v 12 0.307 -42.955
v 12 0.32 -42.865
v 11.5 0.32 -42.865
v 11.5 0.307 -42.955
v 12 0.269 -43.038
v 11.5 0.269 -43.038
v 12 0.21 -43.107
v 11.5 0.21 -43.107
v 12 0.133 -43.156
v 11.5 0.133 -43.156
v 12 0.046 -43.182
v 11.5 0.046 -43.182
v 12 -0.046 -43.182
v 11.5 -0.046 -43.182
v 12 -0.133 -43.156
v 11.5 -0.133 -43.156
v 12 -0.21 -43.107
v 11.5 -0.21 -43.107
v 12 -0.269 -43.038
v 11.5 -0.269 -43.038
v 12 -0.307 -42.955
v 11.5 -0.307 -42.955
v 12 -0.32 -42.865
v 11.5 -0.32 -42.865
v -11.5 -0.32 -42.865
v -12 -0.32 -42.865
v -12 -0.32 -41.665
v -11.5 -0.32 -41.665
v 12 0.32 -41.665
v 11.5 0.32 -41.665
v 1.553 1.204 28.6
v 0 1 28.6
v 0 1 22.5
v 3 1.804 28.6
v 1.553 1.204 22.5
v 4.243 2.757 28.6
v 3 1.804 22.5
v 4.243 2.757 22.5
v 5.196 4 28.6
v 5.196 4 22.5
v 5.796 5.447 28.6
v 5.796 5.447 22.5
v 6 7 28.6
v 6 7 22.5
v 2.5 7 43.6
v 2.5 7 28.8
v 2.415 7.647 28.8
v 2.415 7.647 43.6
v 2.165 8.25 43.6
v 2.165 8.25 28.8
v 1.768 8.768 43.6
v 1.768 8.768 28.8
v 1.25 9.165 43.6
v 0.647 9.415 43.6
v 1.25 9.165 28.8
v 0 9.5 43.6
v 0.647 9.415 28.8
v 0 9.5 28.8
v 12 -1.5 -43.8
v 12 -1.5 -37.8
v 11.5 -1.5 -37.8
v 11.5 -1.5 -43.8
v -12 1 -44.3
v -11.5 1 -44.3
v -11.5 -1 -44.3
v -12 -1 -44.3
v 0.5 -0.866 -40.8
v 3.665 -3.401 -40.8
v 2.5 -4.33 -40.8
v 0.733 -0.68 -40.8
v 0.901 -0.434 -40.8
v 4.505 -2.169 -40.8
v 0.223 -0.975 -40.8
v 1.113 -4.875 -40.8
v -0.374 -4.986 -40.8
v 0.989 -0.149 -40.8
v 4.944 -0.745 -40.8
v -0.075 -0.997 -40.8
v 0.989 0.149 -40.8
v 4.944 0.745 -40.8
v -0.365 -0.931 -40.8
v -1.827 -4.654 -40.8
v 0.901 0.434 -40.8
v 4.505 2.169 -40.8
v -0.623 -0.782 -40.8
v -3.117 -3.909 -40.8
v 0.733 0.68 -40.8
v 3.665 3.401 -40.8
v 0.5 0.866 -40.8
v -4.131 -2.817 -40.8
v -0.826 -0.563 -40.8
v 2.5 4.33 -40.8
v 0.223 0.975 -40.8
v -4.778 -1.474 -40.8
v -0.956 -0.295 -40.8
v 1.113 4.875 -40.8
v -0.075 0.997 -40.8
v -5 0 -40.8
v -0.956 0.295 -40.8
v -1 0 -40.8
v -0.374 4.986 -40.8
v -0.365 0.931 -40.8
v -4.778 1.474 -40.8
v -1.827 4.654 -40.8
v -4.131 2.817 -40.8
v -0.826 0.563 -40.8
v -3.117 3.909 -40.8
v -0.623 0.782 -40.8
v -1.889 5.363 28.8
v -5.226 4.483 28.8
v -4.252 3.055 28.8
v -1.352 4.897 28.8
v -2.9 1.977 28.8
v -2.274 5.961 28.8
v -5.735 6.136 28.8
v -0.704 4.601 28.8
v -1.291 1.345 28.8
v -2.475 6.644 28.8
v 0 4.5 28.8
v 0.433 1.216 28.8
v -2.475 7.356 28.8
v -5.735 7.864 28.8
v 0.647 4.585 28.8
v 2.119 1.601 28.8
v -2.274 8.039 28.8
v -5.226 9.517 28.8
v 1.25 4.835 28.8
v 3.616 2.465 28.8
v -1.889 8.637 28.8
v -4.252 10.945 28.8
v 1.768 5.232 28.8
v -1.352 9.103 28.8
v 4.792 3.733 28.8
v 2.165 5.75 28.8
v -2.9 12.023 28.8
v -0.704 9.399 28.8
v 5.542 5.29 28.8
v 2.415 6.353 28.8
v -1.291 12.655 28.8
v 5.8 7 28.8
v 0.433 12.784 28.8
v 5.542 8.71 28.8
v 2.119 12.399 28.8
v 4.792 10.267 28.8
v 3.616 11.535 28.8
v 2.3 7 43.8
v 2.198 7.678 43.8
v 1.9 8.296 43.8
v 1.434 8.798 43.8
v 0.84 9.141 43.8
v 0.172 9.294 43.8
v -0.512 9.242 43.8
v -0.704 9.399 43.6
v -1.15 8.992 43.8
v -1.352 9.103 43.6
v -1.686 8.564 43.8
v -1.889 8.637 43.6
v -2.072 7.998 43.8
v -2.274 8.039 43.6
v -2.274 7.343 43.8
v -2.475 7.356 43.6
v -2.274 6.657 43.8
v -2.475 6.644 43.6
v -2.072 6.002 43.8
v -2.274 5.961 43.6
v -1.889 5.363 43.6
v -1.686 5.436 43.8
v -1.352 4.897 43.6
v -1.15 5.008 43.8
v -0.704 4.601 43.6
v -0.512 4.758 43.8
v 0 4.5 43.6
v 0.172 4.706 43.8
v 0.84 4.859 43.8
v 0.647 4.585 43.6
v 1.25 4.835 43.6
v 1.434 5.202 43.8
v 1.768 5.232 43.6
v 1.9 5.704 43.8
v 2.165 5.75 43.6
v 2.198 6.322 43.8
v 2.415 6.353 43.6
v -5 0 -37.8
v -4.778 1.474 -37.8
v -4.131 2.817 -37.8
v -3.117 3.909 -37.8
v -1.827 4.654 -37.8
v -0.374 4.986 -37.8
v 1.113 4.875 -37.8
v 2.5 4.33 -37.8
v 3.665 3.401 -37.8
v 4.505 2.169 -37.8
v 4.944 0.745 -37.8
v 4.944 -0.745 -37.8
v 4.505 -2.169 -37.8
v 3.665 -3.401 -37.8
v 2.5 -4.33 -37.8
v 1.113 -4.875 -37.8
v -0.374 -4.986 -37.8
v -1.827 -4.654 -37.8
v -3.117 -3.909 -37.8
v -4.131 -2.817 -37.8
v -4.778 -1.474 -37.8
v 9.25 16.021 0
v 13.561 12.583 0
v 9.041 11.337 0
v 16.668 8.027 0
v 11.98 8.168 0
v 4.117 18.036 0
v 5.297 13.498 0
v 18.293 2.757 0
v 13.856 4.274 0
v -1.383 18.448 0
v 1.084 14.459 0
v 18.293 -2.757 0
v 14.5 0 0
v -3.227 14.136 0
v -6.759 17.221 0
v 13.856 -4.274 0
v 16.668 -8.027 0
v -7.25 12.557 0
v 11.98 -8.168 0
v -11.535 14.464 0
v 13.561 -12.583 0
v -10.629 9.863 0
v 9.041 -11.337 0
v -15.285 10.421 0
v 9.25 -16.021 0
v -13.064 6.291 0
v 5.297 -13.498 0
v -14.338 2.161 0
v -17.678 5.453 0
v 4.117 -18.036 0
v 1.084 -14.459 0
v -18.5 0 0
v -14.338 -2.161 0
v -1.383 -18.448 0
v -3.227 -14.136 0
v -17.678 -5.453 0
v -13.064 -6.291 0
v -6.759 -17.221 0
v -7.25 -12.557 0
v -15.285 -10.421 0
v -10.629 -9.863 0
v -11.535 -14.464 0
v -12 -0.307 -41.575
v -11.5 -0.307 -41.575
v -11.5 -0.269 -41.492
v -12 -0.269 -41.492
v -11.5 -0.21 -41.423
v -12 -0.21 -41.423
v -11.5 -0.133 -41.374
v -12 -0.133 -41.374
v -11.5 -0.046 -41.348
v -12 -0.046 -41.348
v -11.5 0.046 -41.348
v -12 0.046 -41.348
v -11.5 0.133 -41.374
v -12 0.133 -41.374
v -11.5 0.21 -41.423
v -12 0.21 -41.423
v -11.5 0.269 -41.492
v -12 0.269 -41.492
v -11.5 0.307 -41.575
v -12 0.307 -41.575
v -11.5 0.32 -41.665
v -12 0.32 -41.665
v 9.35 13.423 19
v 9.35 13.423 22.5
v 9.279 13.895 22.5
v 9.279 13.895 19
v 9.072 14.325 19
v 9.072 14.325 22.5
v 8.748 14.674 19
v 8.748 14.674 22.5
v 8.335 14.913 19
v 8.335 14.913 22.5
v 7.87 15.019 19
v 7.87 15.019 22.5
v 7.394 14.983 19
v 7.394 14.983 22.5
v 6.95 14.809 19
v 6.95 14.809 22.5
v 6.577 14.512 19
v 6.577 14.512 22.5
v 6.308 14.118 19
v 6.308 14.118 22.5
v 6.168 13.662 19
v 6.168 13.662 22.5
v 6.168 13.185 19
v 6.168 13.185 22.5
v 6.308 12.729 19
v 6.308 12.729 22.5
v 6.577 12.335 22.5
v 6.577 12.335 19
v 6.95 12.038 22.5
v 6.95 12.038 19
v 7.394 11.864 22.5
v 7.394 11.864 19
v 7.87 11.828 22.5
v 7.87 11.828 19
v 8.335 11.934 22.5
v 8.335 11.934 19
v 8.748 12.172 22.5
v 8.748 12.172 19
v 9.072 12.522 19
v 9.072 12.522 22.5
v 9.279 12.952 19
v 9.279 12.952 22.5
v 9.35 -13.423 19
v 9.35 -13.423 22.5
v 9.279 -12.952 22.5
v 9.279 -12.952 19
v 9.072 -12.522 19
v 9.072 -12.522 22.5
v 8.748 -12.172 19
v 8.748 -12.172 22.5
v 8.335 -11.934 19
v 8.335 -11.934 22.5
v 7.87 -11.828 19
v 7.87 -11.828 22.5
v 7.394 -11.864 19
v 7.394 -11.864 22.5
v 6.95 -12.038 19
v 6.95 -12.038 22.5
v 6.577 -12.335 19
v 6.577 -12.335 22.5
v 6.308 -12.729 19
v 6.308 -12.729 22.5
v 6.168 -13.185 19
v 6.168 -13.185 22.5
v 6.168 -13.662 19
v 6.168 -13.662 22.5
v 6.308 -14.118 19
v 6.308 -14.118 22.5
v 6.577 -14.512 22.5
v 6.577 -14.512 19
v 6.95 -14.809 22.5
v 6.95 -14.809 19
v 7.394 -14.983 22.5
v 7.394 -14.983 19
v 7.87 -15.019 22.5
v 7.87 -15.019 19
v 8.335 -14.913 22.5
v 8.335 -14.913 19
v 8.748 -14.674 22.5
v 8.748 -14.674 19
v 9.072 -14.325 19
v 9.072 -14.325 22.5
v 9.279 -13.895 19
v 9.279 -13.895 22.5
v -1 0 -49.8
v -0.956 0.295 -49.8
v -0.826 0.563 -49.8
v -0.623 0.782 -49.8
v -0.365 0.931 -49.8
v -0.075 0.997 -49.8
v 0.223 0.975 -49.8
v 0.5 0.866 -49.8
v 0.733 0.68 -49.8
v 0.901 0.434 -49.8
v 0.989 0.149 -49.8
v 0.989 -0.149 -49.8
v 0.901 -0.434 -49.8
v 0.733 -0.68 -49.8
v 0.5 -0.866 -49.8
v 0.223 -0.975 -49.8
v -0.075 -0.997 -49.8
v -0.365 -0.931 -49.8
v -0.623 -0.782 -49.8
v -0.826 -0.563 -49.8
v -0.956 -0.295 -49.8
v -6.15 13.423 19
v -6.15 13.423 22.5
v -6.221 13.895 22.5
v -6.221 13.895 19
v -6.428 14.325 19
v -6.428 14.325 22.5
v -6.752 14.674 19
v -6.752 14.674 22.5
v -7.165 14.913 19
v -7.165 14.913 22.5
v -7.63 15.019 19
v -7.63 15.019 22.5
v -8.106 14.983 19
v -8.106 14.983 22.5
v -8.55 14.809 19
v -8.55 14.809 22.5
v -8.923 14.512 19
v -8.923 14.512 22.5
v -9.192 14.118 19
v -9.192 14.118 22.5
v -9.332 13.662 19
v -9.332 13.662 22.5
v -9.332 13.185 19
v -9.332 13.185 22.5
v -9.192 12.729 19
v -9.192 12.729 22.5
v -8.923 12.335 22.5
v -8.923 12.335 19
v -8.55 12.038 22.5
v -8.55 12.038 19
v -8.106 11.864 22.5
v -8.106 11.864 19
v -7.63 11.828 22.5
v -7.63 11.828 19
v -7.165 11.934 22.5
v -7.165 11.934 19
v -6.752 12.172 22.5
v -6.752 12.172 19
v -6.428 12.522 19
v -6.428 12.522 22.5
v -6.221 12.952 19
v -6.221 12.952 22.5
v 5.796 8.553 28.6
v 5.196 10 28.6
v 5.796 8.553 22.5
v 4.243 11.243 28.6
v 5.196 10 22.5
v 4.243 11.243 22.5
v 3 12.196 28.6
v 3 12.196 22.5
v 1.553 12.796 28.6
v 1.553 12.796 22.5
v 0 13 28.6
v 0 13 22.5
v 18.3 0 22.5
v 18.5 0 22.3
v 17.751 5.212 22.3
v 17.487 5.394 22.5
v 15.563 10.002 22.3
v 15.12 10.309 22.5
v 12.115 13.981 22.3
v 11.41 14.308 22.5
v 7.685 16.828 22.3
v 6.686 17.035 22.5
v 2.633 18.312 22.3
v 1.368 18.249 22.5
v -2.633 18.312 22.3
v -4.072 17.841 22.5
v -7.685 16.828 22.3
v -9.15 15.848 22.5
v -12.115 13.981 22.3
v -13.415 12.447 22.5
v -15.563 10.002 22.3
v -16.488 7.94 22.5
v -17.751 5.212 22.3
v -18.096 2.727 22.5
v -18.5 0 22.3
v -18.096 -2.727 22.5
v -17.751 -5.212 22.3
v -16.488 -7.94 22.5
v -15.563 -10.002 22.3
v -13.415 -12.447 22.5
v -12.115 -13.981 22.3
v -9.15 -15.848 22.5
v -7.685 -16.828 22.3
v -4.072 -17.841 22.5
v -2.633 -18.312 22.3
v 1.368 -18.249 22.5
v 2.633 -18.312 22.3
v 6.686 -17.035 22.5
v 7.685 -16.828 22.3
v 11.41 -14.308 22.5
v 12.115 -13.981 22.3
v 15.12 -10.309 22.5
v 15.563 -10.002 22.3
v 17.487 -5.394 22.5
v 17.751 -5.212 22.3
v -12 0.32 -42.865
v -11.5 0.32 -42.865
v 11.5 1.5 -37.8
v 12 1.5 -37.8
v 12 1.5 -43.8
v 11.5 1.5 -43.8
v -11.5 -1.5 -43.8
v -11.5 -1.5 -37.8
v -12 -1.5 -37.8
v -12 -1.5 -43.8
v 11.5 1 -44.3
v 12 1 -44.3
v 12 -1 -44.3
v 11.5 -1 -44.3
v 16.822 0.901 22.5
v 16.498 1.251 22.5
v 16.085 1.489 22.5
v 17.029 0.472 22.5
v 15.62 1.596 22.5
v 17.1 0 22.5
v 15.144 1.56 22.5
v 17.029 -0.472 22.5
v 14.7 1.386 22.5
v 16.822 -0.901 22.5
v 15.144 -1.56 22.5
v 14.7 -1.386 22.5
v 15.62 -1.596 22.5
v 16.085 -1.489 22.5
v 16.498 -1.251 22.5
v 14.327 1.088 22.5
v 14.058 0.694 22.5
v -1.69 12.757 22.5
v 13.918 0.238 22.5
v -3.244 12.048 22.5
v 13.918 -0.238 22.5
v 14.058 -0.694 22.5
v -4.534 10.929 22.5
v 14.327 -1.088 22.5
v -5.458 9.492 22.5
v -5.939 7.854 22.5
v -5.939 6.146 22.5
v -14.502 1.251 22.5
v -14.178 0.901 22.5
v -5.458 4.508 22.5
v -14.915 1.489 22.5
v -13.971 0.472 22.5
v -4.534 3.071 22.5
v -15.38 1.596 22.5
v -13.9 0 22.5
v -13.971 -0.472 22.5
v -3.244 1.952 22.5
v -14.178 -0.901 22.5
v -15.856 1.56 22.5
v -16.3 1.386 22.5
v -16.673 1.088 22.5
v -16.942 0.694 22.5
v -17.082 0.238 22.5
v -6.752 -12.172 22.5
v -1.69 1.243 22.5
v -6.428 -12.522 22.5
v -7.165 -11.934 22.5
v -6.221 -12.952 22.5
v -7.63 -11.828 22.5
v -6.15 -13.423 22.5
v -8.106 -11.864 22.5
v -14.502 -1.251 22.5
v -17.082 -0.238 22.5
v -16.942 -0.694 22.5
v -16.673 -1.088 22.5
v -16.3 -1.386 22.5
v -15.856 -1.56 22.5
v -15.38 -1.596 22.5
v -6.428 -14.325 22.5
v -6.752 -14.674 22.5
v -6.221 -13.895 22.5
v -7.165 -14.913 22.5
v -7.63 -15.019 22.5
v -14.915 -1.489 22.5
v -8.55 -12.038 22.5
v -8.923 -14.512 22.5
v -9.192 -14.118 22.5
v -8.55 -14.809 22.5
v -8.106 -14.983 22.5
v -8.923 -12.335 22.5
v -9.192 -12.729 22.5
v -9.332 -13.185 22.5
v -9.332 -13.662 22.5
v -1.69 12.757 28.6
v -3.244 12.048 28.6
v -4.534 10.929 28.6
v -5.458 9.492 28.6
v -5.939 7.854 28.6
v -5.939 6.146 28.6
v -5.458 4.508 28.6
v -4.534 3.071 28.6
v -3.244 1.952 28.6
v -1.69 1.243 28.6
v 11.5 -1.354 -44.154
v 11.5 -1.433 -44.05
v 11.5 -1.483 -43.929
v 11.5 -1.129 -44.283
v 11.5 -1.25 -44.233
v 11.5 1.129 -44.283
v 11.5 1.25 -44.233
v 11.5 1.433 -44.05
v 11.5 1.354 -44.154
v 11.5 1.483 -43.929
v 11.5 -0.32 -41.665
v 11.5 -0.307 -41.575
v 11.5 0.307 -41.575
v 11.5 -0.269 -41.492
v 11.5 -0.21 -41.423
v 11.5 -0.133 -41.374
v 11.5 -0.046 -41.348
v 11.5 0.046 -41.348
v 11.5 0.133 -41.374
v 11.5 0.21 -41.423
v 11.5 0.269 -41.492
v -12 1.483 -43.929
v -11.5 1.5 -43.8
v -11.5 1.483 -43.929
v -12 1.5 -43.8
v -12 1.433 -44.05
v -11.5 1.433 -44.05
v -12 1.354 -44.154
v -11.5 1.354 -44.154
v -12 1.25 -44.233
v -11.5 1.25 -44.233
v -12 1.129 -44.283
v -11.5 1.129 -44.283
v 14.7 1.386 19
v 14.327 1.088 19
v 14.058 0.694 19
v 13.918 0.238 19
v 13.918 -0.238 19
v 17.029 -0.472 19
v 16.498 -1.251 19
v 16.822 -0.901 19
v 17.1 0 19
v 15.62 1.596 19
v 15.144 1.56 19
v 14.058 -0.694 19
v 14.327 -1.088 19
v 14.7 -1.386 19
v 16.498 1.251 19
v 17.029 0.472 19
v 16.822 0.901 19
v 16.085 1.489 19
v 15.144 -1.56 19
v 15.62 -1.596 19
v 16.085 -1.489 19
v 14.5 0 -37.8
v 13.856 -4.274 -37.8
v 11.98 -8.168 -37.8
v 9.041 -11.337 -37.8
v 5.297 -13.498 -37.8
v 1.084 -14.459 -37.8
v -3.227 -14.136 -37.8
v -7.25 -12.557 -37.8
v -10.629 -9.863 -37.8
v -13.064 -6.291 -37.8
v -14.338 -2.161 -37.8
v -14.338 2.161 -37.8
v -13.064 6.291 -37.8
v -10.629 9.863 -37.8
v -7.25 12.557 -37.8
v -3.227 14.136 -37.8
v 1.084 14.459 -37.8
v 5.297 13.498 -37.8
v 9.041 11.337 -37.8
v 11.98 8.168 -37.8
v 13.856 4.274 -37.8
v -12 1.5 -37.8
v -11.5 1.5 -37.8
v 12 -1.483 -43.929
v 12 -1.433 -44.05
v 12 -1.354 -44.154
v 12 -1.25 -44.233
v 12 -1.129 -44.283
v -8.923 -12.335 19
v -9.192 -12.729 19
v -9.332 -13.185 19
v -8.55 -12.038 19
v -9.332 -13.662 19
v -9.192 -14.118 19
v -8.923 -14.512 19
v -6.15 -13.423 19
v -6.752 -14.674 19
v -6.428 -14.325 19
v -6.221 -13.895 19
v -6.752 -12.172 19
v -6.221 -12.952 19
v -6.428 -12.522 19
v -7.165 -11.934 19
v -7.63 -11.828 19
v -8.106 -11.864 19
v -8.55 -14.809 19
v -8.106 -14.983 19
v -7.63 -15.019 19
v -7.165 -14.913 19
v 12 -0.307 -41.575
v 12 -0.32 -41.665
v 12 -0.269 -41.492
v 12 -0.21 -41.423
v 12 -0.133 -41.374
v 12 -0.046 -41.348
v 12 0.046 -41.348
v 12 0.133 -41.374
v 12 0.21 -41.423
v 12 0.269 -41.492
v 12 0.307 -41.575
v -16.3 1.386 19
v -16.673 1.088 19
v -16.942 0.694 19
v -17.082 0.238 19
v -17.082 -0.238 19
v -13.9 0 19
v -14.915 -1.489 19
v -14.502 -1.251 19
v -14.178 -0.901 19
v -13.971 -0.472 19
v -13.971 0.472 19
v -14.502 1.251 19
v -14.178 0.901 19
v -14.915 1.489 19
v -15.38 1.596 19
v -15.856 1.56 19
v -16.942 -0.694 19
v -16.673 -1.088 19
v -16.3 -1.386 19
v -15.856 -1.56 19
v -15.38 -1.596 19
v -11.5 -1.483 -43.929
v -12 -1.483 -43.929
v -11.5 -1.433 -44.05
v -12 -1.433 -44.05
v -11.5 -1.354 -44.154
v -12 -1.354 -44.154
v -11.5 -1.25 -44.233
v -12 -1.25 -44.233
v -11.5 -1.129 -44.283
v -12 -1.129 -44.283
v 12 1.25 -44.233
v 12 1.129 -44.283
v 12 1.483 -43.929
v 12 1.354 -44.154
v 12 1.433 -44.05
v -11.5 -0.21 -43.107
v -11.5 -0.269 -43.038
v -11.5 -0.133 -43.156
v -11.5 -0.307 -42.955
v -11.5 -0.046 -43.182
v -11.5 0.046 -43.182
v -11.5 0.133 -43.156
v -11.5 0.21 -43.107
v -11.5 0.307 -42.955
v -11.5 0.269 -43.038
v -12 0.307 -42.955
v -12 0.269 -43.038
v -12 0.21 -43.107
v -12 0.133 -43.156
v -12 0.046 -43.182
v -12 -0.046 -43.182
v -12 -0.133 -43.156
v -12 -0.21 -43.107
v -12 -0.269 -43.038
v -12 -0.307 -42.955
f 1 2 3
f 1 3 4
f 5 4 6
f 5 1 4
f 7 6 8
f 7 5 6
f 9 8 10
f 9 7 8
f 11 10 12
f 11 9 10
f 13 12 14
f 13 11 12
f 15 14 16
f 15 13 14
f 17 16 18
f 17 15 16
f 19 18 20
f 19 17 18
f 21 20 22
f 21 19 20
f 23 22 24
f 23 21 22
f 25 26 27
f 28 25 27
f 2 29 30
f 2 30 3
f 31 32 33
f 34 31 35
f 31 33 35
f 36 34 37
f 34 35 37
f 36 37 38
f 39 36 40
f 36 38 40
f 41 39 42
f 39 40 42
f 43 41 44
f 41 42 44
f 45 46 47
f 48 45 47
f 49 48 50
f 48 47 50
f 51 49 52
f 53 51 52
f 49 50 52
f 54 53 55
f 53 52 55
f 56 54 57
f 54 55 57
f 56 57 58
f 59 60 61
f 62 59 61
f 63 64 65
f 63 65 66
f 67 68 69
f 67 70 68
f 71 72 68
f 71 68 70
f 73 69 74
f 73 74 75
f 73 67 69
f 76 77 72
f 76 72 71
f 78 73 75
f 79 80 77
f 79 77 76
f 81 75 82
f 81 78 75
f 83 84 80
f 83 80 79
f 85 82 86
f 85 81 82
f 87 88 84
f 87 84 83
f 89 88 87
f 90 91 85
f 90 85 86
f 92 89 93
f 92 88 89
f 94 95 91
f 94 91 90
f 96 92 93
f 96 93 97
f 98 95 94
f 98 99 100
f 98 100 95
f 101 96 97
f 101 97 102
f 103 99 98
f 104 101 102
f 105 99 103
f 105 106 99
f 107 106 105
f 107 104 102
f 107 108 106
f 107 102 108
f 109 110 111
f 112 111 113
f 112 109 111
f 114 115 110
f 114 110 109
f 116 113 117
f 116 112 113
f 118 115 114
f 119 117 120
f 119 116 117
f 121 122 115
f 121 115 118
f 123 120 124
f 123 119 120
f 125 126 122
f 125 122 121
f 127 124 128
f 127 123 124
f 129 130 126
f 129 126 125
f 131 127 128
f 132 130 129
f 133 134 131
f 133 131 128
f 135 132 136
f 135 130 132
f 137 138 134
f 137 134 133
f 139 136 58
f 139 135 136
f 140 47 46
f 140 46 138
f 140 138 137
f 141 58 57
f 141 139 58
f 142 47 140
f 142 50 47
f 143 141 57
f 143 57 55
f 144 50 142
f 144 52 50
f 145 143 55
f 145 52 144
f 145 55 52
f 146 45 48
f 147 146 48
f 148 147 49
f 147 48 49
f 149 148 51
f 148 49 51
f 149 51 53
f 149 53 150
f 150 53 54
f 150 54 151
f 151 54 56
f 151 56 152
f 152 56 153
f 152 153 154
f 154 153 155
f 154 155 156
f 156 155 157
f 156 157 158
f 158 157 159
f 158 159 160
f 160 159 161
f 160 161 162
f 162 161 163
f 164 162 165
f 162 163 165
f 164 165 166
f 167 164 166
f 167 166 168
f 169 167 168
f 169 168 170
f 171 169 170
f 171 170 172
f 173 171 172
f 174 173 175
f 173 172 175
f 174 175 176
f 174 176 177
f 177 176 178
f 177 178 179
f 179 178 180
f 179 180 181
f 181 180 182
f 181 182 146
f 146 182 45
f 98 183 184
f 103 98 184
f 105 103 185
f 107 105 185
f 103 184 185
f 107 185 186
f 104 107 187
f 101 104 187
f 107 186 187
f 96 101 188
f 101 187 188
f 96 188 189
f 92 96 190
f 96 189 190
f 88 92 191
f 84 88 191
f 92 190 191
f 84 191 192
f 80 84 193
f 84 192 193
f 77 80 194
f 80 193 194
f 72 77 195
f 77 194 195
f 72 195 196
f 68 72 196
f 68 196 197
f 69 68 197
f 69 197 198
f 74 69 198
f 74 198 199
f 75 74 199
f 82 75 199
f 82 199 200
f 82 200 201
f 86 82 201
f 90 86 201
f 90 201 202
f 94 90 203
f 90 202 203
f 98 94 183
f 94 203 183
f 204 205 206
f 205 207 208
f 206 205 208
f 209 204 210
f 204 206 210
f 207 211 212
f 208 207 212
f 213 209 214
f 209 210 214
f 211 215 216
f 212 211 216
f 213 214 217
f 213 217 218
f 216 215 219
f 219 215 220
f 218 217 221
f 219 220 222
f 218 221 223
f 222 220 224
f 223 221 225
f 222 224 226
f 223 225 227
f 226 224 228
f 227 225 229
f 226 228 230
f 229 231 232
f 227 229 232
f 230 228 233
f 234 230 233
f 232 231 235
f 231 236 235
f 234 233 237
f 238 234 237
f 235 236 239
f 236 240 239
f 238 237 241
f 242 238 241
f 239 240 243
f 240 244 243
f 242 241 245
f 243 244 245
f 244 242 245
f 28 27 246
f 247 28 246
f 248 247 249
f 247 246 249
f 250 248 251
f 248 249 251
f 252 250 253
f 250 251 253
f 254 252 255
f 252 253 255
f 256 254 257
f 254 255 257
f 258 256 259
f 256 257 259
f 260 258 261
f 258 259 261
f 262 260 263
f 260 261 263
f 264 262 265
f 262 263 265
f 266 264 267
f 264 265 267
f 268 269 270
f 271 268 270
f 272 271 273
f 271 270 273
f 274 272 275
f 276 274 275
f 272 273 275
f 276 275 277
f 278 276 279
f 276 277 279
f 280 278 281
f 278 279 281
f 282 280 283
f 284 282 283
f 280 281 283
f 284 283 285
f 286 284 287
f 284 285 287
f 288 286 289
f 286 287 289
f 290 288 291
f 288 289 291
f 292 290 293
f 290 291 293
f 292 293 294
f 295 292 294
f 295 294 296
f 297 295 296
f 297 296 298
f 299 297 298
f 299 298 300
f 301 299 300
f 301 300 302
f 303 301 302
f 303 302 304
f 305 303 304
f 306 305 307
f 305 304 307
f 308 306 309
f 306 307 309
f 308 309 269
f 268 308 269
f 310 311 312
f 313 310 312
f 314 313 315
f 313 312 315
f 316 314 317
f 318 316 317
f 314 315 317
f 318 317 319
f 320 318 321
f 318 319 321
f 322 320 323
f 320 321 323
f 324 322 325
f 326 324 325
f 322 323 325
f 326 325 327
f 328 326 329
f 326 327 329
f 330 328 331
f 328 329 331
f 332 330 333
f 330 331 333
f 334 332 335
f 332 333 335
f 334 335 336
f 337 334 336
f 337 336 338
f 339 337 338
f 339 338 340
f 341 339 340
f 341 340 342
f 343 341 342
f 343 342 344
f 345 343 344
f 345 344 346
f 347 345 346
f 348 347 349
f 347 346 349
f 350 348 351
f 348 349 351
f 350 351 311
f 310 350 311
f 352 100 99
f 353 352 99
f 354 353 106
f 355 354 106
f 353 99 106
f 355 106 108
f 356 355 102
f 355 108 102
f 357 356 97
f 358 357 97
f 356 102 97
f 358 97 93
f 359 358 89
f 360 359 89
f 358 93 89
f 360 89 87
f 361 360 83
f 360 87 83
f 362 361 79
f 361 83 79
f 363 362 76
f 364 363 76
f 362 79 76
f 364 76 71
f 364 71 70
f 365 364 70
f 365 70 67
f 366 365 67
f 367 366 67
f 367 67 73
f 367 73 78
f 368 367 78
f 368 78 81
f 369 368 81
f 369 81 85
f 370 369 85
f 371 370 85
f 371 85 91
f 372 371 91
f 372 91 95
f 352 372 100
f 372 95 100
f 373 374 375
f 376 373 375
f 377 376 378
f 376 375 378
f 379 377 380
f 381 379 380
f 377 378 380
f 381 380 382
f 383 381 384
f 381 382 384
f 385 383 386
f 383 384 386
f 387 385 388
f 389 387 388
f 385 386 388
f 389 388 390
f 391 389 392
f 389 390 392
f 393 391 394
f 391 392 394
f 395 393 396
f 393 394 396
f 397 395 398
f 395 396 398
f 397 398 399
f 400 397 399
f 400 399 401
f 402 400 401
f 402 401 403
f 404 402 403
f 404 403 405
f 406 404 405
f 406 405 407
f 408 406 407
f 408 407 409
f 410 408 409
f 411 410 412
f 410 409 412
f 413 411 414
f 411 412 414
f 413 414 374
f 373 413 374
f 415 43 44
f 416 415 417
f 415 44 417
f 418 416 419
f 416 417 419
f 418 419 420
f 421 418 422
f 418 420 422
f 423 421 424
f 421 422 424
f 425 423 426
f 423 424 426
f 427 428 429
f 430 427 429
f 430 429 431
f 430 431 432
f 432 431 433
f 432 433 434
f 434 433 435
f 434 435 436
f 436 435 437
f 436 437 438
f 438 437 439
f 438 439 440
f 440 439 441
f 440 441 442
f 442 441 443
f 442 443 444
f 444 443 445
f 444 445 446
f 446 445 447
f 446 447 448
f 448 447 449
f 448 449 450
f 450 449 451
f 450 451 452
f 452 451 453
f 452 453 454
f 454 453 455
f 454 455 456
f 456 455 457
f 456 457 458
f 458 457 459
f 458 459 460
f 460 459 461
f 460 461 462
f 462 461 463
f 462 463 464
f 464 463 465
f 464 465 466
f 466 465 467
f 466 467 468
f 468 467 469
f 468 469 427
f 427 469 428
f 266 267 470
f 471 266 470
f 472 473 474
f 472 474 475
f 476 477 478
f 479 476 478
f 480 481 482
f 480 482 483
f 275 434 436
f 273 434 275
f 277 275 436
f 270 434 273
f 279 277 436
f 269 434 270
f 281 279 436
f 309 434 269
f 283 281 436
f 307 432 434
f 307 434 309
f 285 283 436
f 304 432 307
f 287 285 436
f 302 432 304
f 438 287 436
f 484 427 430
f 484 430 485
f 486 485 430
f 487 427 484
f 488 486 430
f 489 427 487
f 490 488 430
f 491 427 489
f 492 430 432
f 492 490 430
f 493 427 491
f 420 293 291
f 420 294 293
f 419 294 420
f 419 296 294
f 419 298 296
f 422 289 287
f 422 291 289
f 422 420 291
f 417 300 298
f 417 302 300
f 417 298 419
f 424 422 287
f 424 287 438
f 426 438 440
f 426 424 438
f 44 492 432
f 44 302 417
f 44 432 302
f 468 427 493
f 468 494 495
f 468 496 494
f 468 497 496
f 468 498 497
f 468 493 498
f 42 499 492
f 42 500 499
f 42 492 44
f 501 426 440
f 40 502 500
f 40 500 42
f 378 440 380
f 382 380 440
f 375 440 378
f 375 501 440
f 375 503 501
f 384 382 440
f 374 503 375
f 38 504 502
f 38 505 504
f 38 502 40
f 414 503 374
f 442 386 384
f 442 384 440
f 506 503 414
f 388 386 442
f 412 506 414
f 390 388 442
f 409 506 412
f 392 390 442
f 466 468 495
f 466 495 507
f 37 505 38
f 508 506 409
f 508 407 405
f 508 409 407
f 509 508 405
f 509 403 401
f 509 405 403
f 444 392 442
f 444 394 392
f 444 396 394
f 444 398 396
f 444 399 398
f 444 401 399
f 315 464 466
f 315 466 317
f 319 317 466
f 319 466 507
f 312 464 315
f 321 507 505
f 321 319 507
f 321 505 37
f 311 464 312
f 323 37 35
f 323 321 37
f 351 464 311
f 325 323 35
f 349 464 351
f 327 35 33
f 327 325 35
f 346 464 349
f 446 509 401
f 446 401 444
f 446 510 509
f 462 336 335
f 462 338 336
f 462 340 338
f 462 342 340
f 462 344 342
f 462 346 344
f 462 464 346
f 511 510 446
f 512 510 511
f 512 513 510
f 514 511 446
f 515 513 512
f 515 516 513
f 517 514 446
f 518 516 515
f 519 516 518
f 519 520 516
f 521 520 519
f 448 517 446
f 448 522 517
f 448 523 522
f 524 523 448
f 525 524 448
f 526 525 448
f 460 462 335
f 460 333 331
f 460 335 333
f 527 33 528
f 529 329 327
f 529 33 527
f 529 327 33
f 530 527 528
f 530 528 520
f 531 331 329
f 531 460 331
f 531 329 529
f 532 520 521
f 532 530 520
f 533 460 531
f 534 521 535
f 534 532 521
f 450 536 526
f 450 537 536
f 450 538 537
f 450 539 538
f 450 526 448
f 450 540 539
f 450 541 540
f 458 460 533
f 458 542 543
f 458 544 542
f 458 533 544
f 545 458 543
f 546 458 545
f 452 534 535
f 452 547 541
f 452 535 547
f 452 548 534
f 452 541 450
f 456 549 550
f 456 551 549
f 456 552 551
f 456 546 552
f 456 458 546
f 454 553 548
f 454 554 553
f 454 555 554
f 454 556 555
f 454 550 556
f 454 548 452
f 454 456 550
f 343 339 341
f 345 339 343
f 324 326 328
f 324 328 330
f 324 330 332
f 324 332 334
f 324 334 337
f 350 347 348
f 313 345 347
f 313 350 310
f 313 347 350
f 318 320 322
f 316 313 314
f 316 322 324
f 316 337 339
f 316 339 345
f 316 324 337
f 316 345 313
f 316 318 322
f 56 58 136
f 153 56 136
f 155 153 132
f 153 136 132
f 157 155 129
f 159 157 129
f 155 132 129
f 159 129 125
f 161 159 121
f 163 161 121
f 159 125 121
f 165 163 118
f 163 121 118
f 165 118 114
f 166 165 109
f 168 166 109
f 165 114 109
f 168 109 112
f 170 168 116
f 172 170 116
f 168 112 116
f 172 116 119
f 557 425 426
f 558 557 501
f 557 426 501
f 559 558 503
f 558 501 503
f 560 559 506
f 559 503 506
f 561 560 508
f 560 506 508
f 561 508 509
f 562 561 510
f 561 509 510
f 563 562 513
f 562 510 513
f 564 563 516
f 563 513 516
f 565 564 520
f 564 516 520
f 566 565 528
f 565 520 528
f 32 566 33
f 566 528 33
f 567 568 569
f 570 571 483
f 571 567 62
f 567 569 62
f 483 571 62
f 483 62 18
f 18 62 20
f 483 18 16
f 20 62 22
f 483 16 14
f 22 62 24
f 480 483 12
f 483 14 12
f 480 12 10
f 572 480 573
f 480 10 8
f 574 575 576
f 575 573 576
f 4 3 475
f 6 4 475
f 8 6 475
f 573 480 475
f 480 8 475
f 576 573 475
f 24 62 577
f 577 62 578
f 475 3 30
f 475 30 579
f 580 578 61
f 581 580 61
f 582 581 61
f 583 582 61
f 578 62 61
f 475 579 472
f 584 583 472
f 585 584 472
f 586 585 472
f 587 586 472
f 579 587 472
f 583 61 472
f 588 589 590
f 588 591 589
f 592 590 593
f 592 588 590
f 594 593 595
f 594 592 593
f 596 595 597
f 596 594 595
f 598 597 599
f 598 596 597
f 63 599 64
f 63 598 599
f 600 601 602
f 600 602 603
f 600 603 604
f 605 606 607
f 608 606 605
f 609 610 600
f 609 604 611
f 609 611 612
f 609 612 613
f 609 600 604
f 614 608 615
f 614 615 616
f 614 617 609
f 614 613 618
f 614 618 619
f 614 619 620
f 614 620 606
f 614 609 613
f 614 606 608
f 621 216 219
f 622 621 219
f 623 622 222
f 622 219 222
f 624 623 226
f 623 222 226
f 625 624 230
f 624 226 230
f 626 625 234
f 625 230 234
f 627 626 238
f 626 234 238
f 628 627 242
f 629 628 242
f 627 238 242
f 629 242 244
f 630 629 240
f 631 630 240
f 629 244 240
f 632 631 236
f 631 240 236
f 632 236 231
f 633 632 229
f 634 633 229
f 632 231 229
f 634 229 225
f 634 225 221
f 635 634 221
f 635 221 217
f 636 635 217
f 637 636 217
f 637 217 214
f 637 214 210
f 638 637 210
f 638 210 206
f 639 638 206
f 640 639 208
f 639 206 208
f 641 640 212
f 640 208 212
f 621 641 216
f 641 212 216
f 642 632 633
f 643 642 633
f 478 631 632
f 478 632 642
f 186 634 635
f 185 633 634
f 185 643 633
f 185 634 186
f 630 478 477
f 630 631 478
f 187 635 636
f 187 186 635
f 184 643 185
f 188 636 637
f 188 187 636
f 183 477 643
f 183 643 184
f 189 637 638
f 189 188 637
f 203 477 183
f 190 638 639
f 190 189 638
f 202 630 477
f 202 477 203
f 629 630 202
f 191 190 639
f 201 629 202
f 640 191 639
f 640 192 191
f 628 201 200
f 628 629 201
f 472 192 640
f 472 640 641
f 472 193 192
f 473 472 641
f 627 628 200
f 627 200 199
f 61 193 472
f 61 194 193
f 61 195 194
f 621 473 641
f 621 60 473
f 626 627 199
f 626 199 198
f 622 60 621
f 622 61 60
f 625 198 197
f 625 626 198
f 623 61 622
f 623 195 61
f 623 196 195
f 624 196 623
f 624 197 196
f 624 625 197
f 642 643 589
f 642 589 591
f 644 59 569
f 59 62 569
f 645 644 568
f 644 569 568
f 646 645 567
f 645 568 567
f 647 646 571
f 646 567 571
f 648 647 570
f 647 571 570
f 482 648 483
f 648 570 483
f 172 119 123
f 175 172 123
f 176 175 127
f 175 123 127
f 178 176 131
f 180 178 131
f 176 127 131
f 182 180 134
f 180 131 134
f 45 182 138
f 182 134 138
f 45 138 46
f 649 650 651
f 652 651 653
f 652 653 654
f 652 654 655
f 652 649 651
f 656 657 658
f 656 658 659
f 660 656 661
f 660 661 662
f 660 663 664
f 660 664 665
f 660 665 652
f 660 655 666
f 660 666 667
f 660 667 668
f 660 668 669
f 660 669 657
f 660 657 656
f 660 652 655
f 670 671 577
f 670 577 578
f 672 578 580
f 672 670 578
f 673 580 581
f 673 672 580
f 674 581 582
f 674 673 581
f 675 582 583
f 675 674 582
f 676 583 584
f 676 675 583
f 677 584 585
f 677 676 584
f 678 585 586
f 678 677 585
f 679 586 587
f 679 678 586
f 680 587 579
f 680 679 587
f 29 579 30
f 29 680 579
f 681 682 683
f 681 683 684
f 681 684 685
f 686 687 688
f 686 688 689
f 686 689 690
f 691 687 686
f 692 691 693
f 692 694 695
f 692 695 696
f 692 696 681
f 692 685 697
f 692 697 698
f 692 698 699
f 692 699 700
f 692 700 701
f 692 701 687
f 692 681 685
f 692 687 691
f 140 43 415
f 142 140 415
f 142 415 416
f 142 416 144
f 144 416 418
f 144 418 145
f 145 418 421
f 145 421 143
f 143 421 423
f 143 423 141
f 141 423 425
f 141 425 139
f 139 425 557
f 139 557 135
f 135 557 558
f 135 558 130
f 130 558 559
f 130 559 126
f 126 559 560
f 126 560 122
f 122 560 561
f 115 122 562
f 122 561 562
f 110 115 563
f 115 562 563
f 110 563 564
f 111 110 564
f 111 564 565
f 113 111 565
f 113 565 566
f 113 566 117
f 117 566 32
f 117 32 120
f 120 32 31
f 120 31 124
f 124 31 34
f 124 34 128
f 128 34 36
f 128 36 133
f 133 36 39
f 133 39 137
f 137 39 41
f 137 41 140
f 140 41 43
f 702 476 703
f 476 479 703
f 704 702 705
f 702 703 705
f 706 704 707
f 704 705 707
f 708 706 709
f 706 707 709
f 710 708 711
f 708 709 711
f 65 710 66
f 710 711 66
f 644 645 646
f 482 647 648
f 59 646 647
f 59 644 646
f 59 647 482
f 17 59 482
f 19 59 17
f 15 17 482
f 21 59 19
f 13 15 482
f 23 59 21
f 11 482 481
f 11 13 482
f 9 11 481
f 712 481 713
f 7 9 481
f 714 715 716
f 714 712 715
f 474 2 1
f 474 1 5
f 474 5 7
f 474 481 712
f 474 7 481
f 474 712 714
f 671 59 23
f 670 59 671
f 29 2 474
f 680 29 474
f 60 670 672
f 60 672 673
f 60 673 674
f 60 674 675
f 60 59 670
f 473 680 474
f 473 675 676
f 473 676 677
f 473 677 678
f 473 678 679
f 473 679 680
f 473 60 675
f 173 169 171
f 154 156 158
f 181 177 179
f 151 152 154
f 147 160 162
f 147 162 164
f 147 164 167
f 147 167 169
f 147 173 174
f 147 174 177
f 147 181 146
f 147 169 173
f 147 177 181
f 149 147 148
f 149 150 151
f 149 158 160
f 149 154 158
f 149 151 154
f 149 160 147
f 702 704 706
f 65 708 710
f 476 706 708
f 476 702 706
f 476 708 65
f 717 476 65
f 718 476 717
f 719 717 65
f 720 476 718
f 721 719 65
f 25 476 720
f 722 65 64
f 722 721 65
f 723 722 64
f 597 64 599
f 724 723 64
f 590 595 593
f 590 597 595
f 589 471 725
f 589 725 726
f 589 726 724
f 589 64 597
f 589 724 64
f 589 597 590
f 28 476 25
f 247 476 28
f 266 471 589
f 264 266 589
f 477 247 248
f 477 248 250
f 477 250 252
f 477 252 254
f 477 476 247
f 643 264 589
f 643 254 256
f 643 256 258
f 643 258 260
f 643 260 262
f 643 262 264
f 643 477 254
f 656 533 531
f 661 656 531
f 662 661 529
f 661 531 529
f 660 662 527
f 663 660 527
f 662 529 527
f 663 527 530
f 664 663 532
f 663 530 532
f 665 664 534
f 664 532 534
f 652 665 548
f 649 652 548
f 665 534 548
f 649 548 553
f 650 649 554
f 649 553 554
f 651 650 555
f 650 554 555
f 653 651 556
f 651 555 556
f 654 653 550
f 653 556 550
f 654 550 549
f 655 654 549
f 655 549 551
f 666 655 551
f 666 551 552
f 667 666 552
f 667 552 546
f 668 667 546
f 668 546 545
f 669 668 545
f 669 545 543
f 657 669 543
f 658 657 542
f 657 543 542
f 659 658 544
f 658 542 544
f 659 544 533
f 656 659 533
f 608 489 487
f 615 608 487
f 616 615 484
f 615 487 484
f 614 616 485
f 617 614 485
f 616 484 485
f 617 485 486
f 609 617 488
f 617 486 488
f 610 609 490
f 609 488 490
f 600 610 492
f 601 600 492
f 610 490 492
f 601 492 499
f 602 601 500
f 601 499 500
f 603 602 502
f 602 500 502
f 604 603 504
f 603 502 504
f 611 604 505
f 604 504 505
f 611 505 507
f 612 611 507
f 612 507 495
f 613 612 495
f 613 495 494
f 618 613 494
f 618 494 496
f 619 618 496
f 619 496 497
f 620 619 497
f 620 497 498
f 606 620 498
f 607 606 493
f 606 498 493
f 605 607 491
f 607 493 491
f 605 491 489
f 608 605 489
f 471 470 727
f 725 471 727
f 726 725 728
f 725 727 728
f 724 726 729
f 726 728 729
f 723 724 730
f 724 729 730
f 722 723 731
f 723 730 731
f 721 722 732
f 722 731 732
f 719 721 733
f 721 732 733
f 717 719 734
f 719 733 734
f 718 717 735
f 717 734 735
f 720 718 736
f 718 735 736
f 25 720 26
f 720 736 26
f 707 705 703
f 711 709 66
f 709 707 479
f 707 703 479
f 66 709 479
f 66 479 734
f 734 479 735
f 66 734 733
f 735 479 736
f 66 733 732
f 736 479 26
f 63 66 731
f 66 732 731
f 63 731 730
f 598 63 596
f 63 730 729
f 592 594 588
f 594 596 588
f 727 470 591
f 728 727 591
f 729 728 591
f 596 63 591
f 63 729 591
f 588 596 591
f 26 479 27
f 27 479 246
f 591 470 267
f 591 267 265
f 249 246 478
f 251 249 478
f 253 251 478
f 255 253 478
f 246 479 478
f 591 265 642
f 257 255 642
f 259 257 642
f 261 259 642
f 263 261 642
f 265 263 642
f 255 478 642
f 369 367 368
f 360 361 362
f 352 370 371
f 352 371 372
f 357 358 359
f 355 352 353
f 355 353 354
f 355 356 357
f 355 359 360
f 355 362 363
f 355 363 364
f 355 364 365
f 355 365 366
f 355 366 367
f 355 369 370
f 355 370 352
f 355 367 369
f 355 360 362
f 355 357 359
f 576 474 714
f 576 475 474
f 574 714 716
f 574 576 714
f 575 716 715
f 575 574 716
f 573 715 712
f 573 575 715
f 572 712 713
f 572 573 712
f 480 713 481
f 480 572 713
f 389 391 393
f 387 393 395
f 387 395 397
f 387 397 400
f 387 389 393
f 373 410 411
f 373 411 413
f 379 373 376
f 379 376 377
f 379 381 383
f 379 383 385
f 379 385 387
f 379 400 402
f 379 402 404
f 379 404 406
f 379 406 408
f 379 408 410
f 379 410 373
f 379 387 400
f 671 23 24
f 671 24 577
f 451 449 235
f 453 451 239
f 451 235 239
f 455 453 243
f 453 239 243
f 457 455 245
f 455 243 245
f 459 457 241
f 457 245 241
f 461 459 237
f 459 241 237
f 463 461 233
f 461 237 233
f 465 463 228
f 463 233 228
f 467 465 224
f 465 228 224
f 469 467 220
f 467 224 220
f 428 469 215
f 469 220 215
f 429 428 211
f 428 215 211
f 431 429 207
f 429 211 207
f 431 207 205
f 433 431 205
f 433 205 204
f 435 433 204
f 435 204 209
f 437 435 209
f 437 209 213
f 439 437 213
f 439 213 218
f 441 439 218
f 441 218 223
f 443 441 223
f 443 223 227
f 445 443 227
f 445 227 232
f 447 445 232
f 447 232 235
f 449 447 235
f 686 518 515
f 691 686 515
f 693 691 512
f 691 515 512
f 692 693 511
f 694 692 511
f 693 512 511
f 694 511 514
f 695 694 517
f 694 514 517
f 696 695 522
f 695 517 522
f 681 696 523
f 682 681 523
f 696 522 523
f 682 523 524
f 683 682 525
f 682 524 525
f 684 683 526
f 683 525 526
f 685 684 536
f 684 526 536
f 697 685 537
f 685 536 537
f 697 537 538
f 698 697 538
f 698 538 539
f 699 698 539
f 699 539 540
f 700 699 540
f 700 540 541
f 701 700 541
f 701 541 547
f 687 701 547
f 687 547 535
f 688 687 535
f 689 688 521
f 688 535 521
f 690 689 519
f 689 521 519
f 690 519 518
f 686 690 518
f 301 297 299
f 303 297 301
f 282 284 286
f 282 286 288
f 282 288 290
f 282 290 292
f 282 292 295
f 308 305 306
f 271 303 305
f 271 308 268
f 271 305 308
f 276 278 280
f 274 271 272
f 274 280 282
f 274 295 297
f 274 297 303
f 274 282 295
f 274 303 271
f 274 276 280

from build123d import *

# Parameters (mm, degrees)
SKETCH1_R           = 18.5
BOSS_EXTRUDE1_DEPTH = 22.5
SKETCH2_R           = 1.6
CUT_EXTRUDE1_DEPTH  = 3.5
SKETCH3_R           = 2.5
BOSS_EXTRUDE2_DEPTH = 21.3
SKETCH3_3_R         = 6
SKETCH3_3_R_2       = 2.5
BOSS_EXTRUDE3_DEPTH = 6.3
SKETCH4_R           = 14.5
BOSS_EXTRUDE4_DEPTH = 37.8
SKETCH5_R           = 5
BOSS_EXTRUDE5_DEPTH = 3
SKETCH6_R           = 1
BOSS_EXTRUDE6_DEPTH = 9
SKETCH7_W           = 0.5
SKETCH7_H           = 3
BOSS_EXTRUDE7_DEPTH = 6.5
CUT_EXTRUDE2_DEPTH  = 0.5
FILLET1_R           = 0.5
CHAMFER1_SIZE       = 0.2


with BuildPart() as part:
    # Sketch1 → Boss-Extrude1 (new body)
    with BuildSketch(Plane.XY):
        Circle(SKETCH1_R)
    extrude(amount=BOSS_EXTRUDE1_DEPTH)

    # Sketch2 → Cut-Extrude1 (cut)
    with BuildSketch(Plane.XY.offset(22.5)):
        with Locations((-7.75, 13.423393759)):
            Circle(SKETCH2_R)
        with Locations((7.75, 13.423393759)):
            Circle(SKETCH2_R)
        with Locations((-15.5, 0)):
            Circle(SKETCH2_R)
        with Locations((-7.75, -13.423393759)):
            Circle(SKETCH2_R)
        with Locations((7.75, -13.423393759)):
            Circle(SKETCH2_R)
        with Locations((15.5, 0)):
            Circle(SKETCH2_R)
    extrude(amount=-CUT_EXTRUDE1_DEPTH, mode=Mode.SUBTRACT)

    # Sketch3 → Boss-Extrude2 (add)
    with BuildSketch(Plane.XY.offset(22.5)):
        with Locations((0, 7)):
            Circle(SKETCH3_R)
    extrude(amount=BOSS_EXTRUDE2_DEPTH)

    # Sketch3<3> → Boss-Extrude3 (add)
    with BuildSketch(Plane.XY.offset(22.5)):
        with Locations((0, 7)):
            Circle(SKETCH3_3_R)
        with Locations((0, 7)):
            Circle(SKETCH3_3_R_2, mode=Mode.SUBTRACT)
    extrude(amount=BOSS_EXTRUDE3_DEPTH)

    # Sketch4 → Boss-Extrude4 (add)
    with BuildSketch(Plane(origin=(0, 0, 0), x_dir=(-1, 0, 0), z_dir=(0, 0, -1))):
        Circle(SKETCH4_R)
    extrude(amount=BOSS_EXTRUDE4_DEPTH)

    # Sketch5 → Boss-Extrude5 (add)
    with BuildSketch(Plane(origin=(0, 0, -37.8), x_dir=(-1, 0, 0), z_dir=(0, 0, -1))):
        Circle(SKETCH5_R)
    extrude(amount=BOSS_EXTRUDE5_DEPTH)

    # Sketch6 → Boss-Extrude6 (add)
    with BuildSketch(Plane(origin=(0, 0, -40.8), x_dir=(-1, 0, 0), z_dir=(0, 0, -1))):
        Circle(SKETCH6_R)
    extrude(amount=BOSS_EXTRUDE6_DEPTH)

    # Sketch7 → Boss-Extrude7 (add)
    with BuildSketch(Plane(origin=(0, 0, -37.8), x_dir=(-1, 0, 0), z_dir=(0, 0, -1))):
        with Locations((-11.75, 0)):
            Rectangle(SKETCH7_W, SKETCH7_H)
        with Locations((11.75, 0)):
            Rectangle(SKETCH7_W, SKETCH7_H)
    extrude(amount=BOSS_EXTRUDE7_DEPTH)

    # Sketch8 → Cut-Extrude2 (cut)
    with BuildSketch(Plane(origin=(12, 0, 0), x_dir=(0, 0, -1), z_dir=(1, 0, 0))):
        with BuildLine():
            Line((42.865122037, -0.320114275), (41.665122037, -0.320114275))
            ThreePointArc((41.665122037, -0.320114275), (41.345007763, 0), (41.665122037, 0.320114275))
            Line((41.665122037, 0.320114275), (42.865122037, 0.320114275))
            ThreePointArc((42.865122037, 0.320114275), (43.185236312, 0), (42.865122037, -0.320114275))
        make_face()
    cut_extrude2 = extrude(amount=-CUT_EXTRUDE2_DEPTH, mode=Mode.SUBTRACT)

    # Mirror2: Cut-Extrude2 across plane
    add(cut_extrude2.mirror(Plane(origin=(0, 0, 0), x_dir=(0, 0, 1), z_dir=(1, 0, 0))), mode=Mode.SUBTRACT)

    # Fillet1
    fillet1_edges = [part.edges().sort_by_distance(p)[0] for p in [
        (-11.75, 1.5, -44.3),
        (-11.75, -1.5, -44.3),
        (11.75, 1.5, -44.3),
        (11.75, -1.5, -44.3),
    ]]
    fillet(fillet1_edges, radius=FILLET1_R)

    # Chamfer1
    chamfer1_edges = [part.edges().sort_by_distance(p)[0] for p in [
        (-18.5, 0, 22.5),
        (-6, 7, 28.8),
        (-2.5, 7, 43.8),
    ]]
    chamfer(chamfer1_edges, length=CHAMFER1_SIZE)


solid = part.part
